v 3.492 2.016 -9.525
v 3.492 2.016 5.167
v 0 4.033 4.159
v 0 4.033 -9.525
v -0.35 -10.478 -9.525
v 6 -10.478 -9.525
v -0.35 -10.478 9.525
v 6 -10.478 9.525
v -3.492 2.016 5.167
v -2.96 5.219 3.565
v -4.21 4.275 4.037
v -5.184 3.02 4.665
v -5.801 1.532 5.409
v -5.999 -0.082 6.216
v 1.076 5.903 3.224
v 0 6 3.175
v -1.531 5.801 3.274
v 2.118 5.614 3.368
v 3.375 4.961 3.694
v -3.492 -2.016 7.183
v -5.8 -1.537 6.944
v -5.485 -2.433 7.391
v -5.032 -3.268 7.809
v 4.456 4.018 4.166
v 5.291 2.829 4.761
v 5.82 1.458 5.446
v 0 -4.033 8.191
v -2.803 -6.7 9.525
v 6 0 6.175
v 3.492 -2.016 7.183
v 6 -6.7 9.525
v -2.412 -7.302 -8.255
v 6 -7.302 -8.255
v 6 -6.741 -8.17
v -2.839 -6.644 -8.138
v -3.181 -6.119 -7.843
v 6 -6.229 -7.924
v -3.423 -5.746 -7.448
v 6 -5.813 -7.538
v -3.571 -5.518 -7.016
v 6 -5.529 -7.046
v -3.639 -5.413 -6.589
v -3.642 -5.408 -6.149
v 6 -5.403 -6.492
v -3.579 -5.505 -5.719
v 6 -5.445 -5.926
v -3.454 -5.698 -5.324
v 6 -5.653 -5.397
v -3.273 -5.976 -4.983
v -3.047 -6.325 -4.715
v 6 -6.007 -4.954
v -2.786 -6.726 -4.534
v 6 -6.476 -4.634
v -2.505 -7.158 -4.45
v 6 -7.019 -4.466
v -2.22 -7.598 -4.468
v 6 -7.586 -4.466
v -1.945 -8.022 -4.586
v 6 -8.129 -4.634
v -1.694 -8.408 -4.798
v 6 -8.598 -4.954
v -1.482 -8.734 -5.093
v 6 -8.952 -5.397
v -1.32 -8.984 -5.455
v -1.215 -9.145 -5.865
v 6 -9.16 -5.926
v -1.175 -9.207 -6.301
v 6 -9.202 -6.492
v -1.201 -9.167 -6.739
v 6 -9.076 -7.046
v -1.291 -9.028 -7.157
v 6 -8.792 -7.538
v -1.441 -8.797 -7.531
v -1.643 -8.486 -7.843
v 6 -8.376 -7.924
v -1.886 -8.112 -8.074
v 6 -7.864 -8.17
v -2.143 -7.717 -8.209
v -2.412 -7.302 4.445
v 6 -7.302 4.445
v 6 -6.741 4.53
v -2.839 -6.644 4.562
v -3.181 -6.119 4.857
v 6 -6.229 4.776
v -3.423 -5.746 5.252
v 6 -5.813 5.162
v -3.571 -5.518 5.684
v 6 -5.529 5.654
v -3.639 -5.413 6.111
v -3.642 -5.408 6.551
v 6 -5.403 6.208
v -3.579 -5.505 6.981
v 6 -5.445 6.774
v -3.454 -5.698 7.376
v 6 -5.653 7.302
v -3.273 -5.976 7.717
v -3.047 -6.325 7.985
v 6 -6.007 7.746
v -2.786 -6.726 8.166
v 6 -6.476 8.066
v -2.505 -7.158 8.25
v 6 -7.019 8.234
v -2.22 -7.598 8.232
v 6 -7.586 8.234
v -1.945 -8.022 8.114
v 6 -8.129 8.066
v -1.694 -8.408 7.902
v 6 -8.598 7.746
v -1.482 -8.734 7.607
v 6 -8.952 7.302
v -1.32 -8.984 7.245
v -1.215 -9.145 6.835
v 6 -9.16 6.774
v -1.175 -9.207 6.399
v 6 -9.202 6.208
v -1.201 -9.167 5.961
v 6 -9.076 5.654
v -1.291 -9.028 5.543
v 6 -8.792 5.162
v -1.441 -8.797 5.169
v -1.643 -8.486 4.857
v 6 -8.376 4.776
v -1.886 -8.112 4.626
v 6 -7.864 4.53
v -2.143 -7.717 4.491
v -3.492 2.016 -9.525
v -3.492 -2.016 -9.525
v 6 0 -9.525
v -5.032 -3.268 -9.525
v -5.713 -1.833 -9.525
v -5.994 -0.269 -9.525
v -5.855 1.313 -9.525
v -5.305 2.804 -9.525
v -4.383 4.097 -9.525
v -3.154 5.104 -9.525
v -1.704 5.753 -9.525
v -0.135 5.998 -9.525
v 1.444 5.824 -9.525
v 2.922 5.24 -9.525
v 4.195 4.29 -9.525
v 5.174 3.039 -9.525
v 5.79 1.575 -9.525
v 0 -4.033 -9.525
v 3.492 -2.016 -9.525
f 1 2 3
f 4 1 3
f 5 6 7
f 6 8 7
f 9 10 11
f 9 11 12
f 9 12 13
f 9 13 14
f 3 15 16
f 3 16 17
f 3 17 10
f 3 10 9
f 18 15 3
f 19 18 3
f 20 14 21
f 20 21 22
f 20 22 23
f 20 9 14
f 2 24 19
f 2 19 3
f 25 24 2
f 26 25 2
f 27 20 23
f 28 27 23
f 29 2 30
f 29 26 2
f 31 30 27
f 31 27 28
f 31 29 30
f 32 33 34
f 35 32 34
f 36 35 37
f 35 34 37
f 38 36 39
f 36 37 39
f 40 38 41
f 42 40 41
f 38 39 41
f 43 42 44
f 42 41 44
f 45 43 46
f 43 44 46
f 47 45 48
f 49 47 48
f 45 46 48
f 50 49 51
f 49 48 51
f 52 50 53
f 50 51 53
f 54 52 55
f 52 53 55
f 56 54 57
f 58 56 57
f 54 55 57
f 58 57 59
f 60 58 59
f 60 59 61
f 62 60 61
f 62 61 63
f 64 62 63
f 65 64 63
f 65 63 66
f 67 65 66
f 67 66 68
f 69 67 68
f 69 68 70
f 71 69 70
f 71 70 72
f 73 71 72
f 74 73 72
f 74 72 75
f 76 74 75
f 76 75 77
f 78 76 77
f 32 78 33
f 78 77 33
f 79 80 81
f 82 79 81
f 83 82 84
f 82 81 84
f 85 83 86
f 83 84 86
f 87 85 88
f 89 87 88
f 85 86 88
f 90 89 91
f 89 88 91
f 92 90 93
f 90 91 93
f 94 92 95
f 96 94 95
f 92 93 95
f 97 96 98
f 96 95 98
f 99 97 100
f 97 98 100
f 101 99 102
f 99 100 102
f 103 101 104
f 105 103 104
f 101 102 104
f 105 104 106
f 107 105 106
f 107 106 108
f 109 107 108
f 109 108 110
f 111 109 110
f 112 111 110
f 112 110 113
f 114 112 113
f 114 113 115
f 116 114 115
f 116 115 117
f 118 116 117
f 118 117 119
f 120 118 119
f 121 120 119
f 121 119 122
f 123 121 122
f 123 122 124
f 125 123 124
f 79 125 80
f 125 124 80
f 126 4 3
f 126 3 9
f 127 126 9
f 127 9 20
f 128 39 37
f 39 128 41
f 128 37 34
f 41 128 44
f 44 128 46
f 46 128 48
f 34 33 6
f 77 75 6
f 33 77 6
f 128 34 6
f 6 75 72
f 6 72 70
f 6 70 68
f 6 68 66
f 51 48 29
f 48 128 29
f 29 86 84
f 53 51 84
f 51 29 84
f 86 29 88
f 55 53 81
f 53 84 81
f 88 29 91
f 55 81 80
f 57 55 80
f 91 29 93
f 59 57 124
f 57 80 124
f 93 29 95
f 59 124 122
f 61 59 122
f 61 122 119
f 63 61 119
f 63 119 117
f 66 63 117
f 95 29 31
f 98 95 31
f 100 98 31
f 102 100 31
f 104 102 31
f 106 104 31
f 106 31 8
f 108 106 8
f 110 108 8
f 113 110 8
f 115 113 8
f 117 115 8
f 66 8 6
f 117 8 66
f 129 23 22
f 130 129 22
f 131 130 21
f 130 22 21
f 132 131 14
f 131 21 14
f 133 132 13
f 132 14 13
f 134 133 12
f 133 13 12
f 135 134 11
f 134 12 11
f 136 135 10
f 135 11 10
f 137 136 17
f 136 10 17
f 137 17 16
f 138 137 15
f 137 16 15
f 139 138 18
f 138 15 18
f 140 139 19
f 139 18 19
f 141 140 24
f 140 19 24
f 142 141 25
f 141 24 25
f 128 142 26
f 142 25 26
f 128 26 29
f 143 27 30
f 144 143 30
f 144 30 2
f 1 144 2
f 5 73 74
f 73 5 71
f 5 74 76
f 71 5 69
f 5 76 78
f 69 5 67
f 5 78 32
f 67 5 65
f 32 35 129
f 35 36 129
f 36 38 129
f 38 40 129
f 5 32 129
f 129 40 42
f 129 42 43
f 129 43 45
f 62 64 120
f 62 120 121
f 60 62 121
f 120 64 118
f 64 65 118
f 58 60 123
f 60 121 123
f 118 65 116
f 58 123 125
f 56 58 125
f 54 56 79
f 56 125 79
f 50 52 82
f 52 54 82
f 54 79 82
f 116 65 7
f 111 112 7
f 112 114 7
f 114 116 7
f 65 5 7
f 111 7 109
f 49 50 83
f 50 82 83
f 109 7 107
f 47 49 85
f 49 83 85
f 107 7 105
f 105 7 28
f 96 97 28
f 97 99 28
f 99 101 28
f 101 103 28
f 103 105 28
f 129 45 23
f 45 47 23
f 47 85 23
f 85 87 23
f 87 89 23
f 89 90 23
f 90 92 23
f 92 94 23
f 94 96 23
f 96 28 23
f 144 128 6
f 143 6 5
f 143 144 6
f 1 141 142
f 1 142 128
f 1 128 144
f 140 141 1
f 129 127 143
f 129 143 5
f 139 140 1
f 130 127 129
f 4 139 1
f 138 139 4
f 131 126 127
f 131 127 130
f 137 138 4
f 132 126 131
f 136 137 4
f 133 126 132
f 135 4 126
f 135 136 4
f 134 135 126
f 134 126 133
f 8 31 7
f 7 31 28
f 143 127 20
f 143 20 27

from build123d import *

# Parameters (mm, degrees)
BOSS_EXTRUDE1_DEPTH = 9.525
CUT_EXTRUDE1_DEPTH  = 19.560809014
SKETCH3_R           = 1.905
CUT_EXTRUDE2_DEPTH  = 19.560809014


with BuildPart() as part:
    # Sketch1 → Boss-Extrude1 (new, symmetric)
    with BuildSketch(Plane.XY):
        with BuildLine():
            Line((6, 0), (6, -10.4775))
            Line((6, -10.4775), (-0.35, -10.4775))
            Line((-0.35, -10.4775), (-5.032019678, -3.267839953))
            ThreePointArc((-5.032019678, -3.267839953), (-1.704095351, 5.752917437), (6, 0))
        make_face()
        Polygon((3.4925, -2.016395815), (3.4925, 2.016395815), (0, 4.03279163), (-3.4925, 2.016395815), (-3.4925, -2.016395815), (0, -4.03279163), align=None, mode=Mode.SUBTRACT)
    extrude(amount=BOSS_EXTRUDE1_DEPTH, both=True)

    # Sketch2 → Cut-Extrude1 (cut, through all)
    with BuildSketch(Plane(origin=(6, 0, 0), x_dir=(0, 0, -1), z_dir=(1, 0, 0))):
        Polygon((-3.175, 6), (-9.525, -6.7), (-9.525, 6), align=None)
    extrude(amount=-CUT_EXTRUDE1_DEPTH, mode=Mode.SUBTRACT)

    # Sketch3 → Cut-Extrude2 (cut, through all)
    with BuildSketch(Plane(origin=(6, 0, 0), x_dir=(0, 0, -1), z_dir=(1, 0, 0))):
        with Locations((-6.35, -7.3025)):
            Circle(SKETCH3_R)
        with Locations((6.35, -7.3025)):
            Circle(SKETCH3_R)
    extrude(amount=-CUT_EXTRUDE2_DEPTH, mode=Mode.SUBTRACT)


solid = part.part
